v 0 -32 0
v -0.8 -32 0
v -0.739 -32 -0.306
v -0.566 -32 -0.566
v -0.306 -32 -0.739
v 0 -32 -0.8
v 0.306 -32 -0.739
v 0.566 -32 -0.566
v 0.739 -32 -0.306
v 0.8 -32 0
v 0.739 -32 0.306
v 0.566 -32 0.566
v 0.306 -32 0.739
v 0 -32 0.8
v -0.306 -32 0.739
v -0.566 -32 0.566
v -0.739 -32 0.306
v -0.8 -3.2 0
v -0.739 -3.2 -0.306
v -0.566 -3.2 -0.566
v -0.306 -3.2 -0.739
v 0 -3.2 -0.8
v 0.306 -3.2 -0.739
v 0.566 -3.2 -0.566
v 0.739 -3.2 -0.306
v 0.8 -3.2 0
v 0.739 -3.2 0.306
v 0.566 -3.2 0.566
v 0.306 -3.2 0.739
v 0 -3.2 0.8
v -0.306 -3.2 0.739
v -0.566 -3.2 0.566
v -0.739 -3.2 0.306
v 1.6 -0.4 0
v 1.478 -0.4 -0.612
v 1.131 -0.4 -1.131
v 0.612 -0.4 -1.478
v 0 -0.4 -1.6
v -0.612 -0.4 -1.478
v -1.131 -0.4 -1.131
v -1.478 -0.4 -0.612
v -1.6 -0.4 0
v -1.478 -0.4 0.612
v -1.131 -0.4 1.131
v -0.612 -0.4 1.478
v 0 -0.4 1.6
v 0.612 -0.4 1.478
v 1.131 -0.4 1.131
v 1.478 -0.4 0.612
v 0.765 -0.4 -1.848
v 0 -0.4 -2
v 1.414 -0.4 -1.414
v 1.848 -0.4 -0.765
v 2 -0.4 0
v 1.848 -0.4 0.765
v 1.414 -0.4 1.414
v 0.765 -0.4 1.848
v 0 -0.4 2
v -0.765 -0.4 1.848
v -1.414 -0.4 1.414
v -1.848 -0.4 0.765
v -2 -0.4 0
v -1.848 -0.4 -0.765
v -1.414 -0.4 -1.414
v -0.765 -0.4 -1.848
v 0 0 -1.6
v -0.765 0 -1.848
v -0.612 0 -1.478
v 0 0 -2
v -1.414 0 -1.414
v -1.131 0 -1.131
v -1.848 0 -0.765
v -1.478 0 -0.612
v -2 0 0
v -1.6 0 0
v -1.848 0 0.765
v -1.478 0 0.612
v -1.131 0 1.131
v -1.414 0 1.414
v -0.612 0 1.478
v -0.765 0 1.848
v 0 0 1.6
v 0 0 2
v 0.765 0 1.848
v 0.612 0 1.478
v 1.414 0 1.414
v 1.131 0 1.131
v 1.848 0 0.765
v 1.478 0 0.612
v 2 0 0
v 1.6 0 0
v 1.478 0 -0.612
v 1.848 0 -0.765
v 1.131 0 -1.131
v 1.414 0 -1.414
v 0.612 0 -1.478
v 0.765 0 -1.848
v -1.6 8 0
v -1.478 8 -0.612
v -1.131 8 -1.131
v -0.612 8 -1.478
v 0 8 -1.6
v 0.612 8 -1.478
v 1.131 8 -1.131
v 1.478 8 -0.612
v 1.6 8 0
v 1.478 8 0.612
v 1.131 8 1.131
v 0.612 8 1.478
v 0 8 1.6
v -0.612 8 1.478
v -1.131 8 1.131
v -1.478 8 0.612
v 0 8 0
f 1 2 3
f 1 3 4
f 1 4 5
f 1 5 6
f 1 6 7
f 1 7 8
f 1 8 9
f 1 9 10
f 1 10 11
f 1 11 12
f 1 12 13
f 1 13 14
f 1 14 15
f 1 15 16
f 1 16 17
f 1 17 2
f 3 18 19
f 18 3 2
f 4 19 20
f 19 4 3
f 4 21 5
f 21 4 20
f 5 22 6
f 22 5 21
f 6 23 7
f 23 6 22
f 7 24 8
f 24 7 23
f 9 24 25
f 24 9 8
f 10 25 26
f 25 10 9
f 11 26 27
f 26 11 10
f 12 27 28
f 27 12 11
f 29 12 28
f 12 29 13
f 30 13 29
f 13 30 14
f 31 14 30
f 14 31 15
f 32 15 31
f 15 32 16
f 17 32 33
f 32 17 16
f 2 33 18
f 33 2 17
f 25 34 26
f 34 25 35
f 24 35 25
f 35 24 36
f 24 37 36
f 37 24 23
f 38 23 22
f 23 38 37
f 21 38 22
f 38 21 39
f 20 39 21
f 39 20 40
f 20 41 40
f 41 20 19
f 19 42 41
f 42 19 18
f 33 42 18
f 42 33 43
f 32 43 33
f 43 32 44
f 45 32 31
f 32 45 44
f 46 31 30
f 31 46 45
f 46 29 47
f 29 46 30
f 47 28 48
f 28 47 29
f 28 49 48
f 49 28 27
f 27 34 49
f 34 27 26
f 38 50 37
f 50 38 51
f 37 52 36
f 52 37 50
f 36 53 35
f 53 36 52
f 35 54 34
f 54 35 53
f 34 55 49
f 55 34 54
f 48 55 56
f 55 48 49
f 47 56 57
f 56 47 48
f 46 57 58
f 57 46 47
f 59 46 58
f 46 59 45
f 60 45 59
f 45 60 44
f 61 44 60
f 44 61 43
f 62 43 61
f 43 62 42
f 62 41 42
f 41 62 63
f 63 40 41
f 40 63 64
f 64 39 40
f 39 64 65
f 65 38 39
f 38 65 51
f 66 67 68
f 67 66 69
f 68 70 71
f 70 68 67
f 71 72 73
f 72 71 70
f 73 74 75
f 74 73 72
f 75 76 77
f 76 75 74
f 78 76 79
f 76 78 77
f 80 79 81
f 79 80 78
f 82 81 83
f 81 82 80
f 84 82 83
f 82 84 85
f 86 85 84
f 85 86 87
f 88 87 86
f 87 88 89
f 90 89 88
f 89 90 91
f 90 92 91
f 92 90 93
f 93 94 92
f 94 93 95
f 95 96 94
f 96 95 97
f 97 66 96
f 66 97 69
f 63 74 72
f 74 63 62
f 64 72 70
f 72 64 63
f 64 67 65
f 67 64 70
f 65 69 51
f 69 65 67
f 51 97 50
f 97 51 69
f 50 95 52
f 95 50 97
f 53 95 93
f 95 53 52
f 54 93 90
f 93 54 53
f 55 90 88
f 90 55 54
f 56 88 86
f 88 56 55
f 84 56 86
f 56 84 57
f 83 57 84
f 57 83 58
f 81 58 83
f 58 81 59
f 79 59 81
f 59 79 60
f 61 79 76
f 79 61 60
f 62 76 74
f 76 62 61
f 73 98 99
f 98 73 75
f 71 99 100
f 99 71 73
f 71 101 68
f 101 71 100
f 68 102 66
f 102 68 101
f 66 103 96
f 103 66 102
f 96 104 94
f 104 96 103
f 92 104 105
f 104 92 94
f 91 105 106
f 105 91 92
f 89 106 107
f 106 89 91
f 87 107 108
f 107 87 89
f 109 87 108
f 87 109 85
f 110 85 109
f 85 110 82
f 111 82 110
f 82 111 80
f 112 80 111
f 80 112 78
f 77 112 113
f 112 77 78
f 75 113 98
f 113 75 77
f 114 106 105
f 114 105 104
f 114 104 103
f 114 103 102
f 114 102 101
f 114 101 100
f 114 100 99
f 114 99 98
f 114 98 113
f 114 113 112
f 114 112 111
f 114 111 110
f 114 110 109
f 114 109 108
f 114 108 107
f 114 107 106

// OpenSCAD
// file: ../p/4-4ring4.scad
use <../lib.scad>
function ldraw_lib__4_4ring4() = [
// 0 Ring  4 x 1.0
// 0 Name: 4-4ring4.dat
// 0 Author: James Jessiman
// 0 !LDRAW_ORG Primitive UPDATE 2009-01
// 0 !LICENSE Licensed under CC BY 2.0 and CC BY 4.0 : see CAreadme.txt
// 
// 0 BFC CERTIFY CCW
  [0,"BFC","CERTIFY"],
  [0,"BFC","CCW"],
// 
// 0 !HISTORY 1998-12-15 [PTadmin] Official Update 1998-10
// 0 !HISTORY 2002-04-08 [BrickCaster] Modified for BFC compliance
// 0 !HISTORY 2002-04-25 [PTadmin] Official Update 2002-02
// 0 !HISTORY 2007-06-24 [PTadmin] Header formatted for Contributor Agreement
// 0 !HISTORY 2008-07-01 [PTadmin] Official Update 2008-01
// 0 !HISTORY 2008-08-26 [cwdee] Switch polygon winding and rename
// 0 !HISTORY 2009-05-02 [PTadmin] Official Update 2009-01
// 
// 
// 4 16 -1.9135 0 4.6195 -1.5308 0 3.6956 0 0 4 0 0 5
  [4,16,-1.9135,0,4.6195,-1.5308,0,3.6956,0,0,4,0,0,5],
// 4 16 -3.5355 0 3.5355 -2.8284 0 2.8284 -1.5308 0 3.6956 -1.9135 0 4.6195
  [4,16,-3.5355,0,3.5355,-2.8284,0,2.8284,-1.5308,0,3.6956,-1.9135,0,4.6195],
// 4 16 -4.6195 0 1.9135 -3.6956 0 1.5308 -2.8284 0 2.8284 -3.5355 0 3.5355
  [4,16,-4.6195,0,1.9135,-3.6956,0,1.5308,-2.8284,0,2.8284,-3.5355,0,3.5355],
// 4 16 -5 0 0 -4 0 0 -3.6956 0 1.5308 -4.6195 0 1.9135
  [4,16,-5,0,0,-4,0,0,-3.6956,0,1.5308,-4.6195,0,1.9135],
// 4 16 -4.6195 0 -1.9135 -3.6956 0 -1.5308 -4 0 0 -5 0 0
  [4,16,-4.6195,0,-1.9135,-3.6956,0,-1.5308,-4,0,0,-5,0,0],
// 4 16 -3.5355 0 -3.5355 -2.8284 0 -2.8284 -3.6956 0 -1.5308 -4.6195 0 -1.9135
  [4,16,-3.5355,0,-3.5355,-2.8284,0,-2.8284,-3.6956,0,-1.5308,-4.6195,0,-1.9135],
// 4 16 -1.9135 0 -4.6195 -1.5308 0 -3.6956 -2.8284 0 -2.8284 -3.5355 0 -3.5355
  [4,16,-1.9135,0,-4.6195,-1.5308,0,-3.6956,-2.8284,0,-2.8284,-3.5355,0,-3.5355],
// 4 16 0 0 -5 0 0 -4 -1.5308 0 -3.6956 -1.9135 0 -4.6195
  [4,16,0,0,-5,0,0,-4,-1.5308,0,-3.6956,-1.9135,0,-4.6195],
// 4 16 1.9135 0 -4.6195 1.5308 0 -3.6956 0 0 -4 0 0 -5
  [4,16,1.9135,0,-4.6195,1.5308,0,-3.6956,0,0,-4,0,0,-5],
// 4 16 3.5355 0 -3.5355 2.8284 0 -2.8284 1.5308 0 -3.6956 1.9135 0 -4.6195
  [4,16,3.5355,0,-3.5355,2.8284,0,-2.8284,1.5308,0,-3.6956,1.9135,0,-4.6195],
// 4 16 4.6195 0 -1.9135 3.6956 0 -1.5308 2.8284 0 -2.8284 3.5355 0 -3.5355
  [4,16,4.6195,0,-1.9135,3.6956,0,-1.5308,2.8284,0,-2.8284,3.5355,0,-3.5355],
// 4 16 5 0 0 4 0 0 3.6956 0 -1.5308 4.6195 0 -1.9135
  [4,16,5,0,0,4,0,0,3.6956,0,-1.5308,4.6195,0,-1.9135],
// 4 16 4.6195 0 1.9135 3.6956 0 1.5308 4 0 0 5 0 0
  [4,16,4.6195,0,1.9135,3.6956,0,1.5308,4,0,0,5,0,0],
// 4 16 3.5355 0 3.5355 2.8284 0 2.8284 3.6956 0 1.5308 4.6195 0 1.9135
  [4,16,3.5355,0,3.5355,2.8284,0,2.8284,3.6956,0,1.5308,4.6195,0,1.9135],
// 4 16 1.9135 0 4.6195 1.5308 0 3.6956 2.8284 0 2.8284 3.5355 0 3.5355
  [4,16,1.9135,0,4.6195,1.5308,0,3.6956,2.8284,0,2.8284,3.5355,0,3.5355],
// 4 16 0 0 5 0 0 4 1.5308 0 3.6956 1.9135 0 4.6195
  [4,16,0,0,5,0,0,4,1.5308,0,3.6956,1.9135,0,4.6195],
// 0
];
makepoly(ldraw_lib__4_4ring4(), line=0.2);
// file: ../p/4-4edge.scad
use <../lib.scad>
function ldraw_lib__4_4edge() = [
// 0 Circle 1.0
// 0 Name: 4-4edge.dat
// 0 Author: James Jessiman
// 0 !LDRAW_ORG Primitive UPDATE 2017-01
// 0 !LICENSE Licensed under CC BY 2.0 and CC BY 4.0 : see CAreadme.txt
// 
// 0 BFC CERTIFY CCW
  [0,"BFC","CERTIFY"],
  [0,"BFC","CCW"],
// 
// 0 !HISTORY 1998-12-15 [PTadmin] Official Update 1998-10
// 0 !HISTORY 2005-12-28 [PTadmin] Official Update 2005-01
// 0 !HISTORY 2007-06-24 [PTadmin] Header formatted for Contributor Agreement
// 0 !HISTORY 2008-07-01 [PTadmin] Official Update 2008-01
// 0 !HISTORY 2017-01-15 [Steffen] BFCed
// 0 !HISTORY 2017-12-30 [PTadmin] Official Update 2017-01
// 
// 
// 2 24 1 0 0 0.9239 0 0.3827
  [2,24,1,0,0,0.9239,0,0.3827],
// 2 24 0.9239 0 0.3827 0.7071 0 0.7071
  [2,24,0.9239,0,0.3827,0.7071,0,0.7071],
// 2 24 0.7071 0 0.7071 0.3827 0 0.9239
  [2,24,0.7071,0,0.7071,0.3827,0,0.9239],
// 2 24 0.3827 0 0.9239 0 0 1
  [2,24,0.3827,0,0.9239,0,0,1],
// 2 24 0 0 1 -0.3827 0 0.9239
  [2,24,0,0,1,-0.3827,0,0.9239],
// 2 24 -0.3827 0 0.9239 -0.7071 0 0.7071
  [2,24,-0.3827,0,0.9239,-0.7071,0,0.7071],
// 2 24 -0.7071 0 0.7071 -0.9239 0 0.3827
  [2,24,-0.7071,0,0.7071,-0.9239,0,0.3827],
// 2 24 -0.9239 0 0.3827 -1 0 -0
  [2,24,-0.9239,0,0.3827,-1,0,-0],
// 2 24 -1 0 -0 -0.9239 0 -0.3827
  [2,24,-1,0,-0,-0.9239,0,-0.3827],
// 2 24 -0.9239 0 -0.3827 -0.7071 0 -0.7071
  [2,24,-0.9239,0,-0.3827,-0.7071,0,-0.7071],
// 2 24 -0.7071 0 -0.7071 -0.3827 0 -0.9239
  [2,24,-0.7071,0,-0.7071,-0.3827,0,-0.9239],
// 2 24 -0.3827 0 -0.9239 0 0 -1
  [2,24,-0.3827,0,-0.9239,0,0,-1],
// 2 24 0 0 -1 0.3827 0 -0.9239
  [2,24,0,0,-1,0.3827,0,-0.9239],
// 2 24 0.3827 0 -0.9239 0.7071 0 -0.7071
  [2,24,0.3827,0,-0.9239,0.7071,0,-0.7071],
// 2 24 0.7071 0 -0.7071 0.9239 0 -0.3827
  [2,24,0.7071,0,-0.7071,0.9239,0,-0.3827],
// 2 24 0.9239 0 -0.3827 1 0 0
  [2,24,0.9239,0,-0.3827,1,0,0],
];
makepoly(ldraw_lib__4_4edge(), line=0.2);
// file: ../p/4-4disc.scad
use <../lib.scad>
function ldraw_lib__4_4disc() = [
// 0 Disc 1.0
// 0 Name: 4-4disc.dat
// 0 Author: James Jessiman
// 0 !LDRAW_ORG Primitive UPDATE 2002-02
// 0 !LICENSE Licensed under CC BY 2.0 and CC BY 4.0 : see CAreadme.txt
// 
// 0 BFC CERTIFY CCW
  [0,"BFC","CERTIFY"],
  [0,"BFC","CCW"],
// 
// 0 !HISTORY 1998-12-15 [PTadmin] Official Update 1998-10
// 0 !HISTORY 2002-03-23 [sbliss] Added BFC statement
// 0 !HISTORY 2002-04-25 [PTadmin] Official Update 2002-02
// 0 !HISTORY 2007-06-24 [PTadmin] Header formatted for Contributor Agreement
// 0 !HISTORY 2008-07-01 [PTadmin] Official Update 2008-01
// 
// 
// 3 16 0 0 0 1 0 0 0.9239 0 0.3827
  [3,16,0,0,0,1,0,0,0.9239,0,0.3827],
// 3 16 0 0 0 0.9239 0 0.3827 0.7071 0 0.7071
  [3,16,0,0,0,0.9239,0,0.3827,0.7071,0,0.7071],
// 3 16 0 0 0 0.7071 0 0.7071 0.3827 0 0.9239
  [3,16,0,0,0,0.7071,0,0.7071,0.3827,0,0.9239],
// 3 16 0 0 0 0.3827 0 0.9239 0 0 1
  [3,16,0,0,0,0.3827,0,0.9239,0,0,1],
// 3 16 0 0 0 0 0 1 -0.3827 0 0.9239
  [3,16,0,0,0,0,0,1,-0.3827,0,0.9239],
// 3 16 0 0 0 -0.3827 0 0.9239 -0.7071 0 0.7071
  [3,16,0,0,0,-0.3827,0,0.9239,-0.7071,0,0.7071],
// 3 16 0 0 0 -0.7071 0 0.7071 -0.9239 0 0.3827
  [3,16,0,0,0,-0.7071,0,0.7071,-0.9239,0,0.3827],
// 3 16 0 0 0 -0.9239 0 0.3827 -1 0 -0
  [3,16,0,0,0,-0.9239,0,0.3827,-1,0,-0],
// 3 16 0 0 0 -1 0 -0 -0.9239 0 -0.3827
  [3,16,0,0,0,-1,0,-0,-0.9239,0,-0.3827],
// 3 16 0 0 0 -0.9239 0 -0.3827 -0.7071 0 -0.7071
  [3,16,0,0,0,-0.9239,0,-0.3827,-0.7071,0,-0.7071],
// 3 16 0 0 0 -0.7071 0 -0.7071 -0.3827 0 -0.9239
  [3,16,0,0,0,-0.7071,0,-0.7071,-0.3827,0,-0.9239],
// 3 16 0 0 0 -0.3827 0 -0.9239 0 0 -1
  [3,16,0,0,0,-0.3827,0,-0.9239,0,0,-1],
// 3 16 0 0 0 0 0 -1 0.3827 0 -0.9239
  [3,16,0,0,0,0,0,-1,0.3827,0,-0.9239],
// 3 16 0 0 0 0.3827 0 -0.9239 0.7071 0 -0.7071
  [3,16,0,0,0,0.3827,0,-0.9239,0.7071,0,-0.7071],
// 3 16 0 0 0 0.7071 0 -0.7071 0.9239 0 -0.3827
  [3,16,0,0,0,0.7071,0,-0.7071,0.9239,0,-0.3827],
// 3 16 0 0 0 0.9239 0 -0.3827 1 0 0
  [3,16,0,0,0,0.9239,0,-0.3827,1,0,0],
// 0
];
makepoly(ldraw_lib__4_4disc(), line=0.2);
// file: ../p/4-4cyli.scad
use <../lib.scad>
function ldraw_lib__4_4cyli() = [
// 0 Cylinder 1.0
// 0 Name: 4-4cyli.dat
// 0 Author: James Jessiman
// 0 !LDRAW_ORG Primitive UPDATE 2005-01
// 0 !LICENSE Licensed under CC BY 2.0 and CC BY 4.0 : see CAreadme.txt
// 
// 0 BFC CERTIFY CCW
  [0,"BFC","CERTIFY"],
  [0,"BFC","CCW"],
// 
// 0 !HISTORY 1998-12-15 [PTadmin] Official Update 1998-10
// 0 !HISTORY 2002-03-23 [sbliss] Added BFC statement; merged headers from files in distributions LDraw 0.27 and Complete.
// 0 !HISTORY 2002-04-25 [PTadmin] Official Update 2002-02
// 0 !HISTORY 2004-12-14 [guyvivan] BFC CCW
// 0 !HISTORY 2005-12-28 [PTadmin] Official Update 2005-01
// 0 !HISTORY 2007-06-24 [PTadmin] Header formatted for Contributor Agreement
// 0 !HISTORY 2008-07-01 [PTadmin] Official Update 2008-01
// 
// 
// 4 16 1 1 0 0.9239 1 0.3827 0.9239 0 0.3827 1 0 0
  [4,16,1,1,0,0.9239,1,0.3827,0.9239,0,0.3827,1,0,0],
// 5 24 1 0 0 1 1 0 0.9239 0 0.3827 0.9239 0 -0.3827
  [5,24,1,0,0,1,1,0,0.9239,0,0.3827,0.9239,0,-0.3827],
// 4 16 0.9239 1 0.3827 0.7071 1 0.7071 0.7071 0 0.7071 0.9239 0 0.3827
  [4,16,0.9239,1,0.3827,0.7071,1,0.7071,0.7071,0,0.7071,0.9239,0,0.3827],
// 5 24 0.9239 0 0.3827 0.9239 1 0.3827 0.7071 0 0.7071 1 0 0
  [5,24,0.9239,0,0.3827,0.9239,1,0.3827,0.7071,0,0.7071,1,0,0],
// 4 16 0.7071 1 0.7071 0.3827 1 0.9239 0.3827 0 0.9239 0.7071 0 0.7071
  [4,16,0.7071,1,0.7071,0.3827,1,0.9239,0.3827,0,0.9239,0.7071,0,0.7071],
// 5 24 0.7071 0 0.7071 0.7071 1 0.7071 0.3827 0 0.9239 0.9239 0 0.3827
  [5,24,0.7071,0,0.7071,0.7071,1,0.7071,0.3827,0,0.9239,0.9239,0,0.3827],
// 4 16 0.3827 1 0.9239 0 1 1 0 0 1 0.3827 0 0.9239
  [4,16,0.3827,1,0.9239,0,1,1,0,0,1,0.3827,0,0.9239],
// 5 24 0.3827 0 0.9239 0.3827 1 0.9239 0 0 1 0.7071 0 0.7071
  [5,24,0.3827,0,0.9239,0.3827,1,0.9239,0,0,1,0.7071,0,0.7071],
// 4 16 0 1 1 -0.3827 1 0.9239 -0.3827 0 0.9239 0 0 1
  [4,16,0,1,1,-0.3827,1,0.9239,-0.3827,0,0.9239,0,0,1],
// 5 24 0 0 1 0 1 1 -0.3827 0 0.9239 0.3827 0 0.9239
  [5,24,0,0,1,0,1,1,-0.3827,0,0.9239,0.3827,0,0.9239],
// 4 16 -0.3827 1 0.9239 -0.7071 1 0.7071 -0.7071 0 0.7071 -0.3827 0 0.9239
  [4,16,-0.3827,1,0.9239,-0.7071,1,0.7071,-0.7071,0,0.7071,-0.3827,0,0.9239],
// 5 24 -0.3827 0 0.9239 -0.3827 1 0.9239 -0.7071 0 0.7071 0 0 1
  [5,24,-0.3827,0,0.9239,-0.3827,1,0.9239,-0.7071,0,0.7071,0,0,1],
// 4 16 -0.7071 1 0.7071 -0.9239 1 0.3827 -0.9239 0 0.3827 -0.7071 0 0.7071
  [4,16,-0.7071,1,0.7071,-0.9239,1,0.3827,-0.9239,0,0.3827,-0.7071,0,0.7071],
// 5 24 -0.7071 0 0.7071 -0.7071 1 0.7071 -0.9239 0 0.3827 -0.3827 0 0.9239
  [5,24,-0.7071,0,0.7071,-0.7071,1,0.7071,-0.9239,0,0.3827,-0.3827,0,0.9239],
// 4 16 -0.9239 1 0.3827 -1 1 0 -1 0 0 -0.9239 0 0.3827
  [4,16,-0.9239,1,0.3827,-1,1,0,-1,0,0,-0.9239,0,0.3827],
// 5 24 -0.9239 0 0.3827 -0.9239 1 0.3827 -1 0 0 -0.7071 0 0.7071
  [5,24,-0.9239,0,0.3827,-0.9239,1,0.3827,-1,0,0,-0.7071,0,0.7071],
// 4 16 -1 1 0 -0.9239 1 -0.3827 -0.9239 0 -0.3827 -1 0 0
  [4,16,-1,1,0,-0.9239,1,-0.3827,-0.9239,0,-0.3827,-1,0,0],
// 5 24 -1 0 0 -1 1 0 -0.9239 0 -0.3827 -0.9239 0 0.3827
  [5,24,-1,0,0,-1,1,0,-0.9239,0,-0.3827,-0.9239,0,0.3827],
// 4 16 -0.9239 1 -0.3827 -0.7071 1 -0.7071 -0.7071 0 -0.7071 -0.9239 0 -0.3827
  [4,16,-0.9239,1,-0.3827,-0.7071,1,-0.7071,-0.7071,0,-0.7071,-0.9239,0,-0.3827],
// 5 24 -0.9239 0 -0.3827 -0.9239 1 -0.3827 -0.7071 0 -0.7071 -1 0 0
  [5,24,-0.9239,0,-0.3827,-0.9239,1,-0.3827,-0.7071,0,-0.7071,-1,0,0],
// 4 16 -0.7071 1 -0.7071 -0.3827 1 -0.9239 -0.3827 0 -0.9239 -0.7071 0 -0.7071
  [4,16,-0.7071,1,-0.7071,-0.3827,1,-0.9239,-0.3827,0,-0.9239,-0.7071,0,-0.7071],
// 5 24 -0.7071 0 -0.7071 -0.7071 1 -0.7071 -0.3827 0 -0.9239 -0.9239 0 -0.3827
  [5,24,-0.7071,0,-0.7071,-0.7071,1,-0.7071,-0.3827,0,-0.9239,-0.9239,0,-0.3827],
// 4 16 -0.3827 1 -0.9239 0 1 -1 0 0 -1 -0.3827 0 -0.9239
  [4,16,-0.3827,1,-0.9239,0,1,-1,0,0,-1,-0.3827,0,-0.9239],
// 5 24 -0.3827 0 -0.9239 -0.3827 1 -0.9239 0 0 -1 -0.7071 0 -0.7071
  [5,24,-0.3827,0,-0.9239,-0.3827,1,-0.9239,0,0,-1,-0.7071,0,-0.7071],
// 4 16 0 1 -1 0.3827 1 -0.9239 0.3827 0 -0.9239 0 0 -1
  [4,16,0,1,-1,0.3827,1,-0.9239,0.3827,0,-0.9239,0,0,-1],
// 5 24 0 0 -1 0 1 -1 0.3827 0 -0.9239 -0.3827 0 -0.9239
  [5,24,0,0,-1,0,1,-1,0.3827,0,-0.9239,-0.3827,0,-0.9239],
// 4 16 0.3827 1 -0.9239 0.7071 1 -0.7071 0.7071 0 -0.7071 0.3827 0 -0.9239
  [4,16,0.3827,1,-0.9239,0.7071,1,-0.7071,0.7071,0,-0.7071,0.3827,0,-0.9239],
// 5 24 0.3827 0 -0.9239 0.3827 1 -0.9239 0.7071 0 -0.7071 0 0 -1
  [5,24,0.3827,0,-0.9239,0.3827,1,-0.9239,0.7071,0,-0.7071,0,0,-1],
// 4 16 0.7071 1 -0.7071 0.9239 1 -0.3827 0.9239 0 -0.3827 0.7071 0 -0.7071
  [4,16,0.7071,1,-0.7071,0.9239,1,-0.3827,0.9239,0,-0.3827,0.7071,0,-0.7071],
// 5 24 0.7071 0 -0.7071 0.7071 1 -0.7071 0.9239 0 -0.3827 0.3827 0 -0.9239
  [5,24,0.7071,0,-0.7071,0.7071,1,-0.7071,0.9239,0,-0.3827,0.3827,0,-0.9239],
// 4 16 0.9239 1 -0.3827 1 1 0 1 0 0 0.9239 0 -0.3827
  [4,16,0.9239,1,-0.3827,1,1,0,1,0,0,0.9239,0,-0.3827],
// 5 24 0.9239 0 -0.3827 0.9239 1 -0.3827 1 0 0 0.7071 0 -0.7071
  [5,24,0.9239,0,-0.3827,0.9239,1,-0.3827,1,0,0,0.7071,0,-0.7071],
// 0
];
makepoly(ldraw_lib__4_4cyli(), line=0.2);
// file: ../p/4-4con1.scad
use <../lib.scad>
function ldraw_lib__4_4con1() = [
// 0 Cone  1 x 1.0
// 0 Name: 4-4con1.dat
// 0 Author: Steve Bliss [sbliss]
// 0 !LDRAW_ORG Primitive UPDATE 2012-01
// 0 !LICENSE Licensed under CC BY 2.0 and CC BY 4.0 : see CAreadme.txt
// 
// 0 BFC CERTIFY CCW
  [0,"BFC","CERTIFY"],
  [0,"BFC","CCW"],
// 
// 0 !HISTORY 1999-08-19 [sbliss] Renamed 4-4con12.dat to 4-4con1.dat, Moved all conditional lines before quads
// 0 !HISTORY 2000-05-07 [PTadmin] Official Update 2000-01
// 0 !HISTORY 2002-12-11 [cwdee] Standardised title and made BFC compliant
// 0 !HISTORY 2003-08-01 [PTadmin] Official Update 2003-02
// 0 !HISTORY 2007-06-24 [PTadmin] Header formatted for Contributor Agreement
// 0 !HISTORY 2008-07-01 [PTadmin] Official Update 2008-01
// 0 !HISTORY 2012-02-16 [Philo] Changed to CCW, reordered
// 0 !HISTORY 2012-03-30 [PTadmin] Official Update 2012-01
// 
// 
// 5 24 1 1 0 2 0 0 0.9239 1 -0.3827 0.9239 1 0.3827
  [5,24,1,1,0,2,0,0,0.9239,1,-0.3827,0.9239,1,0.3827],
// 5 24 0.9239 1 0.3827 1.8478 0 0.7654 1 1 0 0.7071 1 0.7071
  [5,24,0.9239,1,0.3827,1.8478,0,0.7654,1,1,0,0.7071,1,0.7071],
// 5 24 0.7071 1 0.7071 1.4142 0 1.4142 0.9239 1 0.3827 0.3827 1 0.9239
  [5,24,0.7071,1,0.7071,1.4142,0,1.4142,0.9239,1,0.3827,0.3827,1,0.9239],
// 5 24 0.3827 1 0.9239 0.7654 0 1.8478 0.7071 1 0.7071 0 1 1
  [5,24,0.3827,1,0.9239,0.7654,0,1.8478,0.7071,1,0.7071,0,1,1],
// 5 24 0 1 1 0 0 2 0.3827 1 0.9239 -0.3827 1 0.9239
  [5,24,0,1,1,0,0,2,0.3827,1,0.9239,-0.3827,1,0.9239],
// 5 24 -0.3827 1 0.9239 -0.7654 0 1.8478 0 1 1 -0.7071 1 0.7071
  [5,24,-0.3827,1,0.9239,-0.7654,0,1.8478,0,1,1,-0.7071,1,0.7071],
// 5 24 -0.7071 1 0.7071 -1.4142 0 1.4142 -0.3827 1 0.9239 -0.9239 1 0.3827
  [5,24,-0.7071,1,0.7071,-1.4142,0,1.4142,-0.3827,1,0.9239,-0.9239,1,0.3827],
// 5 24 -0.9239 1 0.3827 -1.8478 0 0.7654 -0.7071 1 0.7071 -1 1 0
  [5,24,-0.9239,1,0.3827,-1.8478,0,0.7654,-0.7071,1,0.7071,-1,1,0],
// 5 24 -1 1 0 -2 0 0 -0.9239 1 0.3827 -0.9239 1 -0.3827
  [5,24,-1,1,0,-2,0,0,-0.9239,1,0.3827,-0.9239,1,-0.3827],
// 5 24 -0.9239 1 -0.3827 -1.8478 0 -0.7654 -1 1 0 -0.7071 1 -0.7071
  [5,24,-0.9239,1,-0.3827,-1.8478,0,-0.7654,-1,1,0,-0.7071,1,-0.7071],
// 5 24 -0.7071 1 -0.7071 -1.4142 0 -1.4142 -0.9239 1 -0.3827 -0.3827 1 -0.9239
  [5,24,-0.7071,1,-0.7071,-1.4142,0,-1.4142,-0.9239,1,-0.3827,-0.3827,1,-0.9239],
// 5 24 -0.3827 1 -0.9239 -0.7654 0 -1.8478 -0.7071 1 -0.7071 0 1 -1
  [5,24,-0.3827,1,-0.9239,-0.7654,0,-1.8478,-0.7071,1,-0.7071,0,1,-1],
// 5 24 0 1 -1 0 0 -2 -0.3827 1 -0.9239 0.3827 1 -0.9239
  [5,24,0,1,-1,0,0,-2,-0.3827,1,-0.9239,0.3827,1,-0.9239],
// 5 24 0.3827 1 -0.9239 0.7654 0 -1.8478 0 1 -1 0.7071 1 -0.7071
  [5,24,0.3827,1,-0.9239,0.7654,0,-1.8478,0,1,-1,0.7071,1,-0.7071],
// 5 24 0.7071 1 -0.7071 1.4142 0 -1.4142 0.3827 1 -0.9239 0.9239 1 -0.3827
  [5,24,0.7071,1,-0.7071,1.4142,0,-1.4142,0.3827,1,-0.9239,0.9239,1,-0.3827],
// 5 24 0.9239 1 -0.3827 1.8478 0 -0.7654 0.7071 1 -0.7071 1 1 0
  [5,24,0.9239,1,-0.3827,1.8478,0,-0.7654,0.7071,1,-0.7071,1,1,0],
// 
// 4 16 2 0 0 1 1 0 0.9239 1 0.3827 1.8478 0 0.7654
  [4,16,2,0,0,1,1,0,0.9239,1,0.3827,1.8478,0,0.7654],
// 4 16 1.8478 0 0.7654 0.9239 1 0.3827 0.7071 1 0.7071 1.4142 0 1.4142
  [4,16,1.8478,0,0.7654,0.9239,1,0.3827,0.7071,1,0.7071,1.4142,0,1.4142],
// 4 16 1.4142 0 1.4142 0.7071 1 0.7071 0.3827 1 0.9239 0.7654 0 1.8478
  [4,16,1.4142,0,1.4142,0.7071,1,0.7071,0.3827,1,0.9239,0.7654,0,1.8478],
// 4 16 0.7654 0 1.8478 0.3827 1 0.9239 0 1 1 0 0 2
  [4,16,0.7654,0,1.8478,0.3827,1,0.9239,0,1,1,0,0,2],
// 4 16 0 0 2 0 1 1 -0.3827 1 0.9239 -0.7654 0 1.8478
  [4,16,0,0,2,0,1,1,-0.3827,1,0.9239,-0.7654,0,1.8478],
// 4 16 -0.7654 0 1.8478 -0.3827 1 0.9239 -0.7071 1 0.7071 -1.4142 0 1.4142
  [4,16,-0.7654,0,1.8478,-0.3827,1,0.9239,-0.7071,1,0.7071,-1.4142,0,1.4142],
// 4 16 -1.4142 0 1.4142 -0.7071 1 0.7071 -0.9239 1 0.3827 -1.8478 0 0.7654
  [4,16,-1.4142,0,1.4142,-0.7071,1,0.7071,-0.9239,1,0.3827,-1.8478,0,0.7654],
// 4 16 -1.8478 0 0.7654 -0.9239 1 0.3827 -1 1 0 -2 0 0
  [4,16,-1.8478,0,0.7654,-0.9239,1,0.3827,-1,1,0,-2,0,0],
// 4 16 -2 0 0 -1 1 0 -0.9239 1 -0.3827 -1.8478 0 -0.7654
  [4,16,-2,0,0,-1,1,0,-0.9239,1,-0.3827,-1.8478,0,-0.7654],
// 4 16 -1.8478 0 -0.7654 -0.9239 1 -0.3827 -0.7071 1 -0.7071 -1.4142 0 -1.4142
  [4,16,-1.8478,0,-0.7654,-0.9239,1,-0.3827,-0.7071,1,-0.7071,-1.4142,0,-1.4142],
// 4 16 -1.4142 0 -1.4142 -0.7071 1 -0.7071 -0.3827 1 -0.9239 -0.7654 0 -1.8478
  [4,16,-1.4142,0,-1.4142,-0.7071,1,-0.7071,-0.3827,1,-0.9239,-0.7654,0,-1.8478],
// 4 16 -0.7654 0 -1.8478 -0.3827 1 -0.9239 0 1 -1 0 0 -2
  [4,16,-0.7654,0,-1.8478,-0.3827,1,-0.9239,0,1,-1,0,0,-2],
// 4 16 0 0 -2 0 1 -1 0.3827 1 -0.9239 0.7654 0 -1.8478
  [4,16,0,0,-2,0,1,-1,0.3827,1,-0.9239,0.7654,0,-1.8478],
// 4 16 0.7654 0 -1.8478 0.3827 1 -0.9239 0.7071 1 -0.7071 1.4142 0 -1.4142
  [4,16,0.7654,0,-1.8478,0.3827,1,-0.9239,0.7071,1,-0.7071,1.4142,0,-1.4142],
// 4 16 1.4142 0 -1.4142 0.7071 1 -0.7071 0.9239 1 -0.3827 1.8478 0 -0.7654
  [4,16,1.4142,0,-1.4142,0.7071,1,-0.7071,0.9239,1,-0.3827,1.8478,0,-0.7654],
// 4 16 1.8478 0 -0.7654 0.9239 1 -0.3827 1 1 0 2 0 0
  [4,16,1.8478,0,-0.7654,0.9239,1,-0.3827,1,1,0,2,0,0],
];
makepoly(ldraw_lib__4_4con1(), line=0.2);
// main file
use <../lib.scad>
use <../p/4-4con1.scad>
use <../p/4-4cyli.scad>
use <../p/4-4disc.scad>
use <../p/4-4edge.scad>
use <../p/4-4ring4.scad>
function ldraw_lib__6640b() = [
// 0 Electric Technic Fiber Optics Cable  5L
// 0 Name: 6640b.dat
// 0 Author: Michael Heidemann [mikeheide]
// 0 !LDRAW_ORG Part UPDATE 2022-06
// 0 !LICENSE Licensed under CC BY 2.0 and CC BY 4.0 : see CAreadme.txt
// 
// 0 BFC CERTIFY CCW
  [0,"BFC","CERTIFY"],
  [0,"BFC","CCW"],
// 
// 0 !HISTORY 2009-09-03 [PTadmin] Official Update 2009-02
// 0 !HISTORY 2021-03-26 [PTadmin] Renamed from 6640
// 0 !HISTORY 2022-12-20 [PTadmin] Official Update 2022-06
// 
// 
// 1 16 0 0 -80 -2 0 0 0 0 2 0 1 0 4-4edge.dat
  [1,16,0,0,-80,-2,0,0,0,0,2,0,1,0, ldraw_lib__4_4edge()],
// 1 16 0 0 -8 -2 0 0 0 0 2 0 1 0 4-4edge.dat
  [1,16,0,0,-8,-2,0,0,0,0,2,0,1,0, ldraw_lib__4_4edge()],
// 1 16 0 0 -1 -4 0 0 0 0 4 0 1 0 4-4edge.dat
  [1,16,0,0,-1,-4,0,0,0,0,4,0,1,0, ldraw_lib__4_4edge()],
// 1 16 0 0 -1 -5 0 0 0 0 5 0 1 0 4-4edge.dat
  [1,16,0,0,-1,-5,0,0,0,0,5,0,1,0, ldraw_lib__4_4edge()],
// 1 16 0 0 0 -5 0 0 0 0 5 0 1 0 4-4edge.dat
  [1,16,0,0,0,-5,0,0,0,0,5,0,1,0, ldraw_lib__4_4edge()],
// 1 16 0 0 0 -4 0 0 0 0 4 0 1 0 4-4edge.dat
  [1,16,0,0,0,-4,0,0,0,0,4,0,1,0, ldraw_lib__4_4edge()],
// 1 16 0 0 20 -4 0 0 0 0 4 0 1 0 4-4edge.dat
  [1,16,0,0,20,-4,0,0,0,0,4,0,1,0, ldraw_lib__4_4edge()],
// 1 16 0 0 -80 -2 0 0 0 0 2 0 1 0 4-4disc.dat
  [1,16,0,0,-80,-2,0,0,0,0,2,0,1,0, ldraw_lib__4_4disc()],
// 1 16 0 0 -80 -2 0 0 0 0 2 0 72 0 4-4cyli.dat
  [1,16,0,0,-80,-2,0,0,0,0,2,0,72,0, ldraw_lib__4_4cyli()],
// 1 16 0 0 -1 2 0 0 0 0 2 0 -7 0 4-4con1.dat
  [1,16,0,0,-1,2,0,0,0,0,2,0,-7,0, ldraw_lib__4_4con1()],
// 1 16 0 0 -1 -1 0 0 0 0 1 0 1 0 4-4ring4.dat
  [1,16,0,0,-1,-1,0,0,0,0,1,0,1,0, ldraw_lib__4_4ring4()],
// 1 16 0 0 0 1 0 0 0 0 1 0 -1 0 4-4ring4.dat
  [1,16,0,0,0,1,0,0,0,0,1,0,-1,0, ldraw_lib__4_4ring4()],
// 1 16 0 0 -1 -5 0 0 0 0 5 0 1 0 4-4cyli.dat
  [1,16,0,0,-1,-5,0,0,0,0,5,0,1,0, ldraw_lib__4_4cyli()],
// 1 16 0 0 0 -4 0 0 0 0 4 0 20 0 4-4cyli.dat
  [1,16,0,0,0,-4,0,0,0,0,4,0,20,0, ldraw_lib__4_4cyli()],
// 1 16 0 0 20 4 0 0 0 0 4 0 -1 0 4-4disc.dat
  [1,16,0,0,20,4,0,0,0,0,4,0,-1,0, ldraw_lib__4_4disc()],
// 0
];
makepoly(ldraw_lib__6640b(), line=0.2);
